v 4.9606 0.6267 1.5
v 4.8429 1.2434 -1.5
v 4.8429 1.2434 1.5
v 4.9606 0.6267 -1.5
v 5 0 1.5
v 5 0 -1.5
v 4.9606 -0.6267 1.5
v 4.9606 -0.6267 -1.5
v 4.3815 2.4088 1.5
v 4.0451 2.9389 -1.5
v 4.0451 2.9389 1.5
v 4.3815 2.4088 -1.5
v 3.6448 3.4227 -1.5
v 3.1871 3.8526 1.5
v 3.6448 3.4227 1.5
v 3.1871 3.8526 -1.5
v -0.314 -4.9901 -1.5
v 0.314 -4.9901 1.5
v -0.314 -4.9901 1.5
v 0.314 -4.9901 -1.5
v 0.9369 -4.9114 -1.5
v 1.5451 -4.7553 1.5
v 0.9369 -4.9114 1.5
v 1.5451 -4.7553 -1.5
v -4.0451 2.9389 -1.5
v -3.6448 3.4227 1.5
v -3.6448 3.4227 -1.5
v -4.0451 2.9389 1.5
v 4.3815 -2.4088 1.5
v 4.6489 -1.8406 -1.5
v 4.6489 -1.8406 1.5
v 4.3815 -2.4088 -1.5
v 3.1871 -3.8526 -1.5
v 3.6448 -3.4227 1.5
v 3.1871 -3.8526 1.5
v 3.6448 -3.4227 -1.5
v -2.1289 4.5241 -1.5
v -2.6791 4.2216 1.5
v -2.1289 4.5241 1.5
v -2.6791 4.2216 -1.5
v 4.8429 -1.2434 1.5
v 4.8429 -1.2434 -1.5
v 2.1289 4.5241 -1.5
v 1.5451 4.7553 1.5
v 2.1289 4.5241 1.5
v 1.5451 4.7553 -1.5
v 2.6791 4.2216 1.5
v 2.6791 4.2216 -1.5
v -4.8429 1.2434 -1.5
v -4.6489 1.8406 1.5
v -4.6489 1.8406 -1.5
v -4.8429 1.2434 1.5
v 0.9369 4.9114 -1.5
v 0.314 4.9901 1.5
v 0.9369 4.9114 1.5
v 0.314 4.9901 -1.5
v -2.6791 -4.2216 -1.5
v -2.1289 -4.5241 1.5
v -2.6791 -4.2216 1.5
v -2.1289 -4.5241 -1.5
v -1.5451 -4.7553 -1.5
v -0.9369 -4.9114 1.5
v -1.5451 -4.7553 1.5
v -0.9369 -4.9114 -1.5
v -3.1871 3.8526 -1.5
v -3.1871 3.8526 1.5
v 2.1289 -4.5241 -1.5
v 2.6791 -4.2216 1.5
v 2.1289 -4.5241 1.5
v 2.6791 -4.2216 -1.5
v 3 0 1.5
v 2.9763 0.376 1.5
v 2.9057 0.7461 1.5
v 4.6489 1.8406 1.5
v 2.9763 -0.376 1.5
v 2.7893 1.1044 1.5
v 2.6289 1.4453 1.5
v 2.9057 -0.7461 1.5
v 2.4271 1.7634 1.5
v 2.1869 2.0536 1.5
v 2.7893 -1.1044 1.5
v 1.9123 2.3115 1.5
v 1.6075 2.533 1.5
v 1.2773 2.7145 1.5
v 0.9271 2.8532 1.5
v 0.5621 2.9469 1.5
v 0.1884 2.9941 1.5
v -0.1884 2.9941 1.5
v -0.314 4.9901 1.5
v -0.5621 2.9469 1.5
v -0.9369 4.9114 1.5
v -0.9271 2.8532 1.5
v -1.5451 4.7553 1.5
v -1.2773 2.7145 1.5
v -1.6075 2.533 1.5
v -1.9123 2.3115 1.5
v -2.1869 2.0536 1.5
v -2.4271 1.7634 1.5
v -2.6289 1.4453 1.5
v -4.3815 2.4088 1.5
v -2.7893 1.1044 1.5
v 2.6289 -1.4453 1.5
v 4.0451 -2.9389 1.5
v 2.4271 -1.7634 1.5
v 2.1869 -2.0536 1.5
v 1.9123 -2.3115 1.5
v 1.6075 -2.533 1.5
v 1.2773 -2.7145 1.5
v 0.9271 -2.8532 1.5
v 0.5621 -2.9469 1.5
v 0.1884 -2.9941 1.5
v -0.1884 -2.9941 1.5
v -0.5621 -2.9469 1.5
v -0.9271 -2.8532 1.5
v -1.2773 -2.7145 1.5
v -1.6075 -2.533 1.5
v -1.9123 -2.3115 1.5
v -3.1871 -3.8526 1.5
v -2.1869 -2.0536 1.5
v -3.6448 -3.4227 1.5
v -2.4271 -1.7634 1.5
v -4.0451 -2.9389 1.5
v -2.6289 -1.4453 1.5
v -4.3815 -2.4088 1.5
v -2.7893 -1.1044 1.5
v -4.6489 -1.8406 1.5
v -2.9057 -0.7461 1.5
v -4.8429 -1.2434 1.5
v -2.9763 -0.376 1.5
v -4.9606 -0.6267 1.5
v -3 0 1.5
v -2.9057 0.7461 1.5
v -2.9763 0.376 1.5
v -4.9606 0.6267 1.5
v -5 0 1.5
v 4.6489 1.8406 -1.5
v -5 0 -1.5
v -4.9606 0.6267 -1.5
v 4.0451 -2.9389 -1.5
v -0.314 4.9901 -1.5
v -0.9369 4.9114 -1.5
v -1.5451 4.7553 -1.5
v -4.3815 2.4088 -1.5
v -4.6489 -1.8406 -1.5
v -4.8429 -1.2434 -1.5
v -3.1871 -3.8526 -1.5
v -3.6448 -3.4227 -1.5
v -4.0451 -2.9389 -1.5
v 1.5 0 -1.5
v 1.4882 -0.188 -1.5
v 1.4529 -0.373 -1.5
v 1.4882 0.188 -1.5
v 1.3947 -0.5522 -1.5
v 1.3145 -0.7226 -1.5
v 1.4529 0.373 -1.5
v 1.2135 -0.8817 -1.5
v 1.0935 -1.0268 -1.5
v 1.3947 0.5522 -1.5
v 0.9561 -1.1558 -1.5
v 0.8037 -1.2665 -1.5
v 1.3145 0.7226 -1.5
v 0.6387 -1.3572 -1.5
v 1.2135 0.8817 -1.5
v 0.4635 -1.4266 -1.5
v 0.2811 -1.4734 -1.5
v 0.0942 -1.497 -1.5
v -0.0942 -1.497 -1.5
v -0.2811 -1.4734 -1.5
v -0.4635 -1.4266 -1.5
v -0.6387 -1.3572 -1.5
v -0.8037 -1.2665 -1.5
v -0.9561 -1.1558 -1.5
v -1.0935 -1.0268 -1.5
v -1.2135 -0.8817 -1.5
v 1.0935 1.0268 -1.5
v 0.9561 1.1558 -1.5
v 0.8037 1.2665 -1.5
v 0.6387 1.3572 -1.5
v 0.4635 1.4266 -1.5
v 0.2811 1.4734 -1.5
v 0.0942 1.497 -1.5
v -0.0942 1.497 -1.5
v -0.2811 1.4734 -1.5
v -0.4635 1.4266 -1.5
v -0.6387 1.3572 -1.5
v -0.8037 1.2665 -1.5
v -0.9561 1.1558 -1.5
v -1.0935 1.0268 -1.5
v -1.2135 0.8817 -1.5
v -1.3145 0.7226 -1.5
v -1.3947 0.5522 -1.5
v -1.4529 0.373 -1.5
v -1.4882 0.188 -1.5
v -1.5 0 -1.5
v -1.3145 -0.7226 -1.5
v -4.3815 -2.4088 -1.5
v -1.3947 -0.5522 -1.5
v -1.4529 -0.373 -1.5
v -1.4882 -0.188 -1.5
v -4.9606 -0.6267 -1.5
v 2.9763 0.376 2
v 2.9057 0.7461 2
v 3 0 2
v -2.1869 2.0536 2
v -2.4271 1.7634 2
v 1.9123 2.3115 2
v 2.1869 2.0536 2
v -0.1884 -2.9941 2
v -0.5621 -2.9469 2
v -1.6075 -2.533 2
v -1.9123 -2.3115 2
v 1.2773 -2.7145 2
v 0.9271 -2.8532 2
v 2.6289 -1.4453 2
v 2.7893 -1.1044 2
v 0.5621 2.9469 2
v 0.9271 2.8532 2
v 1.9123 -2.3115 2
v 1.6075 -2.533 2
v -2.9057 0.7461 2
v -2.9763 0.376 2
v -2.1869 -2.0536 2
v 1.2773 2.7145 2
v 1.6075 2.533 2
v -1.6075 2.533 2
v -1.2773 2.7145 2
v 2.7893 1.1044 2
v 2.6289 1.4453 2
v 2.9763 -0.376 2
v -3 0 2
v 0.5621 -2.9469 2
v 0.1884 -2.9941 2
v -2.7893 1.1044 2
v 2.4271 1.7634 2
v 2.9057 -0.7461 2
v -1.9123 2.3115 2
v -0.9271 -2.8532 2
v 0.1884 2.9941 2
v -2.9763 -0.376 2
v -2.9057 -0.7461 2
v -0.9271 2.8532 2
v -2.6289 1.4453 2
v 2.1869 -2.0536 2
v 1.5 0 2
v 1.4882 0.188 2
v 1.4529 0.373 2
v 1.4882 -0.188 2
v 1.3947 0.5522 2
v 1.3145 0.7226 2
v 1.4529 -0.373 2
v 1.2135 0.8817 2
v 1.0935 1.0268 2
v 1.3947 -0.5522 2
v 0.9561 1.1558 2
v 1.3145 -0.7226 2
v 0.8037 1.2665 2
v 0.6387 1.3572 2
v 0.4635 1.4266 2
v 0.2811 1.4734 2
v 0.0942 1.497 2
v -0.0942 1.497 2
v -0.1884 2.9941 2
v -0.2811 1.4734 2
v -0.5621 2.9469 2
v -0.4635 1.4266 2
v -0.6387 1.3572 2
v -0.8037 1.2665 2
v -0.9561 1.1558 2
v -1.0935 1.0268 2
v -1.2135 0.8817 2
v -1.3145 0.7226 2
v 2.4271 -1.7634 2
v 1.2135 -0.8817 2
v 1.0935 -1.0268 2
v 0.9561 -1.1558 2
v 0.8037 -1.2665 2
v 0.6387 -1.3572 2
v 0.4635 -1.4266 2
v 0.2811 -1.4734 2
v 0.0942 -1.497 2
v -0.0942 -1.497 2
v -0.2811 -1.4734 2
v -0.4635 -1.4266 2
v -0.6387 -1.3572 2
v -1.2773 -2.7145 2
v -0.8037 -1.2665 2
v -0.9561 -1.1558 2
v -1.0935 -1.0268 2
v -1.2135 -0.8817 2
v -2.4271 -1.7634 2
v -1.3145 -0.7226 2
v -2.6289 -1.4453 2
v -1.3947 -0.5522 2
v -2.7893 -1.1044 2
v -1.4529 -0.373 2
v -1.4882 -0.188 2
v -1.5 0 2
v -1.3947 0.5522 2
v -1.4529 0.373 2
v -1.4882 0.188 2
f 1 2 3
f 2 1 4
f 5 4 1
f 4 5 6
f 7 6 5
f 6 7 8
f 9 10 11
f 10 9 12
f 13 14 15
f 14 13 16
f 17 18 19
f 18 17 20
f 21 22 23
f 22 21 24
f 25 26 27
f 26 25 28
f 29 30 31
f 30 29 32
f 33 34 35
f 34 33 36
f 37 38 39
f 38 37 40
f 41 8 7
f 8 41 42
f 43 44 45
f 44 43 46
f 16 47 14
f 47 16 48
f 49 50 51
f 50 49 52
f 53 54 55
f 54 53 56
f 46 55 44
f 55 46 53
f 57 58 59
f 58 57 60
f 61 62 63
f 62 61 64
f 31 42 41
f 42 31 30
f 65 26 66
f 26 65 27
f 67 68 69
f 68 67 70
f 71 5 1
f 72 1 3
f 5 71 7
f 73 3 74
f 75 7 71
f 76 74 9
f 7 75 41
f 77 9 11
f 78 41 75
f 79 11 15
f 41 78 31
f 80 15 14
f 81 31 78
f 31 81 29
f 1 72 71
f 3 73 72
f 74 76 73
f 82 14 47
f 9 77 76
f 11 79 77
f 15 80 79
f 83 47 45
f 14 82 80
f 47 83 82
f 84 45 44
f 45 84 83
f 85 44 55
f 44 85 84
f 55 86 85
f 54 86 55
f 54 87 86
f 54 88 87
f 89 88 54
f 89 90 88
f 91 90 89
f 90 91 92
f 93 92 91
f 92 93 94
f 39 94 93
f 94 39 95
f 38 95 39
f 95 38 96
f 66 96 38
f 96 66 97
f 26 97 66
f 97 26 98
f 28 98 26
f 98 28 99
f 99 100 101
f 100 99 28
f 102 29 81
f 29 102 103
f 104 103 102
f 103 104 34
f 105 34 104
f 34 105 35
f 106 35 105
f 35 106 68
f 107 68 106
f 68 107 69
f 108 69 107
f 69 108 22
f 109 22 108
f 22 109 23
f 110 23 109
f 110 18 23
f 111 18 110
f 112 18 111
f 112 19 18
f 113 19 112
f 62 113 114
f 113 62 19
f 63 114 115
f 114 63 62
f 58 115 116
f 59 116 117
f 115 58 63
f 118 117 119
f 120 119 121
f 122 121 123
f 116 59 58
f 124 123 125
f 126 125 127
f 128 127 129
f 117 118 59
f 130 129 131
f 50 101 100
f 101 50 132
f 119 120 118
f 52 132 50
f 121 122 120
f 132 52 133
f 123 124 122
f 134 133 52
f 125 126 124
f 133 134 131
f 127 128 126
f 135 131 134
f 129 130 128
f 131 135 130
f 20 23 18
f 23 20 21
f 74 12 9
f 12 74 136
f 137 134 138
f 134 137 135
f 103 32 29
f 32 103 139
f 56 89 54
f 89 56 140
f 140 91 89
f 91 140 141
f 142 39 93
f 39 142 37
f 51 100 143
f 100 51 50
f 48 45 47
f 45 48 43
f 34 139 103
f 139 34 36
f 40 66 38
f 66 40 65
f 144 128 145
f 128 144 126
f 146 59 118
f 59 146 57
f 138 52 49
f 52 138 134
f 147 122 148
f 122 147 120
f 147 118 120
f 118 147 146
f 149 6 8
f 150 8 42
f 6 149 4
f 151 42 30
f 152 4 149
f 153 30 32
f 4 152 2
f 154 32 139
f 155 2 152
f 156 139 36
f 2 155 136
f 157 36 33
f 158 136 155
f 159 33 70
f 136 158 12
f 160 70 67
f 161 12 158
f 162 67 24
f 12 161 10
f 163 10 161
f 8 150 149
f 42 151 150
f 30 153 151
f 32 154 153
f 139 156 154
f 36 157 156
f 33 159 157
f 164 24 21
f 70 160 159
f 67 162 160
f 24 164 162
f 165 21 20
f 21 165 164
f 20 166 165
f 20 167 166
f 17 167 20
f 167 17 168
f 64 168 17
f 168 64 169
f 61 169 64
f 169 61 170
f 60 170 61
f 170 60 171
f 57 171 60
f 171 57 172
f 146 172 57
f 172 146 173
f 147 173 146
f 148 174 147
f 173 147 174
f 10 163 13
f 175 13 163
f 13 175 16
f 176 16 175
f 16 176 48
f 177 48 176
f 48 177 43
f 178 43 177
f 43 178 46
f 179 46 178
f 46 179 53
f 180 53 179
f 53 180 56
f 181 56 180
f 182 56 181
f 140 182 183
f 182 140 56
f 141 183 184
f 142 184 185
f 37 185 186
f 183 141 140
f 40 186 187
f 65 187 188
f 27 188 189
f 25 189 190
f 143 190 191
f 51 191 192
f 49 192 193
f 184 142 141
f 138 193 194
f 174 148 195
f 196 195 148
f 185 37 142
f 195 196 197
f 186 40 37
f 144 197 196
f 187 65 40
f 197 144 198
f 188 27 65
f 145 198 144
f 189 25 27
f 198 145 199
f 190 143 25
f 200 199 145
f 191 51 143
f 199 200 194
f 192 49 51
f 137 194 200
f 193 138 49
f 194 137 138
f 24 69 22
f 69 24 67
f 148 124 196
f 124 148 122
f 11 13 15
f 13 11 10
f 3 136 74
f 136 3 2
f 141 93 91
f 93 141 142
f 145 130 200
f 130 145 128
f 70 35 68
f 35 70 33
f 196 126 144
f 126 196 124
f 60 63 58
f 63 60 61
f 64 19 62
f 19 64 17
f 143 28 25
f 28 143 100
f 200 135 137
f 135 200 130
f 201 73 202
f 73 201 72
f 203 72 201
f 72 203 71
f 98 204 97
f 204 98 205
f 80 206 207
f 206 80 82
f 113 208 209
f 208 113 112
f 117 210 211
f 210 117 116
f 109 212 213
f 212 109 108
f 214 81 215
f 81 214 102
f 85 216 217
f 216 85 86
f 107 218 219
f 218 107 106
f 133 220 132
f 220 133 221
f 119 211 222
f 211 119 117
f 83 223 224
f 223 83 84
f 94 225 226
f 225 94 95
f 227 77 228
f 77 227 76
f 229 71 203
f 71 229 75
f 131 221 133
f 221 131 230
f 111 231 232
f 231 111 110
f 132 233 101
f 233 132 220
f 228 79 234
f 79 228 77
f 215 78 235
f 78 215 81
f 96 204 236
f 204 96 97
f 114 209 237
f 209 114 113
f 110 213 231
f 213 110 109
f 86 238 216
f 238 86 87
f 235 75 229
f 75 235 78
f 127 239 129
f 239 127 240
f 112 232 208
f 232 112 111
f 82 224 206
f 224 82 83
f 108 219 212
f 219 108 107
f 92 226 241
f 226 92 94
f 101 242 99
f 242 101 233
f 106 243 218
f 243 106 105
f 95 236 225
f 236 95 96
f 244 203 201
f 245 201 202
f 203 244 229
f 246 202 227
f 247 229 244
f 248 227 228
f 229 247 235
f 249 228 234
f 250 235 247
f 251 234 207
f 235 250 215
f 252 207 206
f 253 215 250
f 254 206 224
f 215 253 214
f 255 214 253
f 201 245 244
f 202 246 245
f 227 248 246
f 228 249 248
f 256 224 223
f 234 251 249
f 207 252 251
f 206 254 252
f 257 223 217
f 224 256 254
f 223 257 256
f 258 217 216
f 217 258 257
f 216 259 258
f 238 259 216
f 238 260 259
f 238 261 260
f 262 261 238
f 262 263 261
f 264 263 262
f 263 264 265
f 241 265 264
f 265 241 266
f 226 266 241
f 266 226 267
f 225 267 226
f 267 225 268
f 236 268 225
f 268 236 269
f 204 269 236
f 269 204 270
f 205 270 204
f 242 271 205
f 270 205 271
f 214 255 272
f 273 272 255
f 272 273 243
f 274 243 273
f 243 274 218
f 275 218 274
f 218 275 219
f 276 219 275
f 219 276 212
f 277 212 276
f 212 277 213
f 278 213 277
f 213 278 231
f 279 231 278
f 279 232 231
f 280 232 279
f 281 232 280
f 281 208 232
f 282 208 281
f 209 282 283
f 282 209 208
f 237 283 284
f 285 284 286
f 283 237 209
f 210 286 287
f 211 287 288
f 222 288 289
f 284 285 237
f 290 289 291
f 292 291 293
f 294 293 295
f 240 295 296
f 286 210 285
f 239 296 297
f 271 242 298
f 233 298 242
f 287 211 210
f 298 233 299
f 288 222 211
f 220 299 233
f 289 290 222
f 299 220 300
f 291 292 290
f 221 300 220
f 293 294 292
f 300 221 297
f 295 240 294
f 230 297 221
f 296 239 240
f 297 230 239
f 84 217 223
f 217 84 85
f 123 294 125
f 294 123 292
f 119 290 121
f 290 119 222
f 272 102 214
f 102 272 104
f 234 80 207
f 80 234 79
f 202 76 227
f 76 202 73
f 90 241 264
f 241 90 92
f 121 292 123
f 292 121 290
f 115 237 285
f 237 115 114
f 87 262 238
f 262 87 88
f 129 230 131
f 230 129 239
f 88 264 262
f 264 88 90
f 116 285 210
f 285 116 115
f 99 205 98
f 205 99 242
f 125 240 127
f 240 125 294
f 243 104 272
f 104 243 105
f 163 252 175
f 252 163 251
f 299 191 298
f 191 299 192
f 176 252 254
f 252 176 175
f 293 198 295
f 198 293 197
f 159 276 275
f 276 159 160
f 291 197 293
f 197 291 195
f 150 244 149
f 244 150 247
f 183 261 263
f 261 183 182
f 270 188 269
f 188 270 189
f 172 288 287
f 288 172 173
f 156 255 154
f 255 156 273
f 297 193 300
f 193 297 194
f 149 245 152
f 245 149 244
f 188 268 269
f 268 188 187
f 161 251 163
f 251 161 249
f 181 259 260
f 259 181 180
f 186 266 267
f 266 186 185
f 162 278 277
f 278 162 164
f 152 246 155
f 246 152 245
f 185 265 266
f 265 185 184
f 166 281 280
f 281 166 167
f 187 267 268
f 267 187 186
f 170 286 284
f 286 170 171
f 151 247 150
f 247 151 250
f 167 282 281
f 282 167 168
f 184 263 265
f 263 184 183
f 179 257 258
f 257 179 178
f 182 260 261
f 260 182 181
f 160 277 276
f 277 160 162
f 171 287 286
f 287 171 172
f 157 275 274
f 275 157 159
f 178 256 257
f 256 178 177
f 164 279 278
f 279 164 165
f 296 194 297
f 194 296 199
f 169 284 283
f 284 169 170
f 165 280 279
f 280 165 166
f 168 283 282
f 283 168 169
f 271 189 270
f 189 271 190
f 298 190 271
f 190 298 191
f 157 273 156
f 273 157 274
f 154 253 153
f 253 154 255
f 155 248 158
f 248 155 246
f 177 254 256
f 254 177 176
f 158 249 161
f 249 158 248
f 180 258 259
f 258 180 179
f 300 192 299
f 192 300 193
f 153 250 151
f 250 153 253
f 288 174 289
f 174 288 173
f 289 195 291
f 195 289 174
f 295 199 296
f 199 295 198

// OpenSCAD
$fn = 50;


difference() {
	union() {
		translate(v = [0, 0, -1.5000000000]) {
			cylinder(h = 3, r = 5.0000000000);
		}
		translate(v = [0, 0, -1.5000000000]) {
			cylinder(h = 3.5000000000, r = 3.0000000000);
		}
	}
	union() {
		translate(v = [0, 0, -100.0000000000]) {
			cylinder(h = 200, r = 1.5000000000);
		}
	}
}
